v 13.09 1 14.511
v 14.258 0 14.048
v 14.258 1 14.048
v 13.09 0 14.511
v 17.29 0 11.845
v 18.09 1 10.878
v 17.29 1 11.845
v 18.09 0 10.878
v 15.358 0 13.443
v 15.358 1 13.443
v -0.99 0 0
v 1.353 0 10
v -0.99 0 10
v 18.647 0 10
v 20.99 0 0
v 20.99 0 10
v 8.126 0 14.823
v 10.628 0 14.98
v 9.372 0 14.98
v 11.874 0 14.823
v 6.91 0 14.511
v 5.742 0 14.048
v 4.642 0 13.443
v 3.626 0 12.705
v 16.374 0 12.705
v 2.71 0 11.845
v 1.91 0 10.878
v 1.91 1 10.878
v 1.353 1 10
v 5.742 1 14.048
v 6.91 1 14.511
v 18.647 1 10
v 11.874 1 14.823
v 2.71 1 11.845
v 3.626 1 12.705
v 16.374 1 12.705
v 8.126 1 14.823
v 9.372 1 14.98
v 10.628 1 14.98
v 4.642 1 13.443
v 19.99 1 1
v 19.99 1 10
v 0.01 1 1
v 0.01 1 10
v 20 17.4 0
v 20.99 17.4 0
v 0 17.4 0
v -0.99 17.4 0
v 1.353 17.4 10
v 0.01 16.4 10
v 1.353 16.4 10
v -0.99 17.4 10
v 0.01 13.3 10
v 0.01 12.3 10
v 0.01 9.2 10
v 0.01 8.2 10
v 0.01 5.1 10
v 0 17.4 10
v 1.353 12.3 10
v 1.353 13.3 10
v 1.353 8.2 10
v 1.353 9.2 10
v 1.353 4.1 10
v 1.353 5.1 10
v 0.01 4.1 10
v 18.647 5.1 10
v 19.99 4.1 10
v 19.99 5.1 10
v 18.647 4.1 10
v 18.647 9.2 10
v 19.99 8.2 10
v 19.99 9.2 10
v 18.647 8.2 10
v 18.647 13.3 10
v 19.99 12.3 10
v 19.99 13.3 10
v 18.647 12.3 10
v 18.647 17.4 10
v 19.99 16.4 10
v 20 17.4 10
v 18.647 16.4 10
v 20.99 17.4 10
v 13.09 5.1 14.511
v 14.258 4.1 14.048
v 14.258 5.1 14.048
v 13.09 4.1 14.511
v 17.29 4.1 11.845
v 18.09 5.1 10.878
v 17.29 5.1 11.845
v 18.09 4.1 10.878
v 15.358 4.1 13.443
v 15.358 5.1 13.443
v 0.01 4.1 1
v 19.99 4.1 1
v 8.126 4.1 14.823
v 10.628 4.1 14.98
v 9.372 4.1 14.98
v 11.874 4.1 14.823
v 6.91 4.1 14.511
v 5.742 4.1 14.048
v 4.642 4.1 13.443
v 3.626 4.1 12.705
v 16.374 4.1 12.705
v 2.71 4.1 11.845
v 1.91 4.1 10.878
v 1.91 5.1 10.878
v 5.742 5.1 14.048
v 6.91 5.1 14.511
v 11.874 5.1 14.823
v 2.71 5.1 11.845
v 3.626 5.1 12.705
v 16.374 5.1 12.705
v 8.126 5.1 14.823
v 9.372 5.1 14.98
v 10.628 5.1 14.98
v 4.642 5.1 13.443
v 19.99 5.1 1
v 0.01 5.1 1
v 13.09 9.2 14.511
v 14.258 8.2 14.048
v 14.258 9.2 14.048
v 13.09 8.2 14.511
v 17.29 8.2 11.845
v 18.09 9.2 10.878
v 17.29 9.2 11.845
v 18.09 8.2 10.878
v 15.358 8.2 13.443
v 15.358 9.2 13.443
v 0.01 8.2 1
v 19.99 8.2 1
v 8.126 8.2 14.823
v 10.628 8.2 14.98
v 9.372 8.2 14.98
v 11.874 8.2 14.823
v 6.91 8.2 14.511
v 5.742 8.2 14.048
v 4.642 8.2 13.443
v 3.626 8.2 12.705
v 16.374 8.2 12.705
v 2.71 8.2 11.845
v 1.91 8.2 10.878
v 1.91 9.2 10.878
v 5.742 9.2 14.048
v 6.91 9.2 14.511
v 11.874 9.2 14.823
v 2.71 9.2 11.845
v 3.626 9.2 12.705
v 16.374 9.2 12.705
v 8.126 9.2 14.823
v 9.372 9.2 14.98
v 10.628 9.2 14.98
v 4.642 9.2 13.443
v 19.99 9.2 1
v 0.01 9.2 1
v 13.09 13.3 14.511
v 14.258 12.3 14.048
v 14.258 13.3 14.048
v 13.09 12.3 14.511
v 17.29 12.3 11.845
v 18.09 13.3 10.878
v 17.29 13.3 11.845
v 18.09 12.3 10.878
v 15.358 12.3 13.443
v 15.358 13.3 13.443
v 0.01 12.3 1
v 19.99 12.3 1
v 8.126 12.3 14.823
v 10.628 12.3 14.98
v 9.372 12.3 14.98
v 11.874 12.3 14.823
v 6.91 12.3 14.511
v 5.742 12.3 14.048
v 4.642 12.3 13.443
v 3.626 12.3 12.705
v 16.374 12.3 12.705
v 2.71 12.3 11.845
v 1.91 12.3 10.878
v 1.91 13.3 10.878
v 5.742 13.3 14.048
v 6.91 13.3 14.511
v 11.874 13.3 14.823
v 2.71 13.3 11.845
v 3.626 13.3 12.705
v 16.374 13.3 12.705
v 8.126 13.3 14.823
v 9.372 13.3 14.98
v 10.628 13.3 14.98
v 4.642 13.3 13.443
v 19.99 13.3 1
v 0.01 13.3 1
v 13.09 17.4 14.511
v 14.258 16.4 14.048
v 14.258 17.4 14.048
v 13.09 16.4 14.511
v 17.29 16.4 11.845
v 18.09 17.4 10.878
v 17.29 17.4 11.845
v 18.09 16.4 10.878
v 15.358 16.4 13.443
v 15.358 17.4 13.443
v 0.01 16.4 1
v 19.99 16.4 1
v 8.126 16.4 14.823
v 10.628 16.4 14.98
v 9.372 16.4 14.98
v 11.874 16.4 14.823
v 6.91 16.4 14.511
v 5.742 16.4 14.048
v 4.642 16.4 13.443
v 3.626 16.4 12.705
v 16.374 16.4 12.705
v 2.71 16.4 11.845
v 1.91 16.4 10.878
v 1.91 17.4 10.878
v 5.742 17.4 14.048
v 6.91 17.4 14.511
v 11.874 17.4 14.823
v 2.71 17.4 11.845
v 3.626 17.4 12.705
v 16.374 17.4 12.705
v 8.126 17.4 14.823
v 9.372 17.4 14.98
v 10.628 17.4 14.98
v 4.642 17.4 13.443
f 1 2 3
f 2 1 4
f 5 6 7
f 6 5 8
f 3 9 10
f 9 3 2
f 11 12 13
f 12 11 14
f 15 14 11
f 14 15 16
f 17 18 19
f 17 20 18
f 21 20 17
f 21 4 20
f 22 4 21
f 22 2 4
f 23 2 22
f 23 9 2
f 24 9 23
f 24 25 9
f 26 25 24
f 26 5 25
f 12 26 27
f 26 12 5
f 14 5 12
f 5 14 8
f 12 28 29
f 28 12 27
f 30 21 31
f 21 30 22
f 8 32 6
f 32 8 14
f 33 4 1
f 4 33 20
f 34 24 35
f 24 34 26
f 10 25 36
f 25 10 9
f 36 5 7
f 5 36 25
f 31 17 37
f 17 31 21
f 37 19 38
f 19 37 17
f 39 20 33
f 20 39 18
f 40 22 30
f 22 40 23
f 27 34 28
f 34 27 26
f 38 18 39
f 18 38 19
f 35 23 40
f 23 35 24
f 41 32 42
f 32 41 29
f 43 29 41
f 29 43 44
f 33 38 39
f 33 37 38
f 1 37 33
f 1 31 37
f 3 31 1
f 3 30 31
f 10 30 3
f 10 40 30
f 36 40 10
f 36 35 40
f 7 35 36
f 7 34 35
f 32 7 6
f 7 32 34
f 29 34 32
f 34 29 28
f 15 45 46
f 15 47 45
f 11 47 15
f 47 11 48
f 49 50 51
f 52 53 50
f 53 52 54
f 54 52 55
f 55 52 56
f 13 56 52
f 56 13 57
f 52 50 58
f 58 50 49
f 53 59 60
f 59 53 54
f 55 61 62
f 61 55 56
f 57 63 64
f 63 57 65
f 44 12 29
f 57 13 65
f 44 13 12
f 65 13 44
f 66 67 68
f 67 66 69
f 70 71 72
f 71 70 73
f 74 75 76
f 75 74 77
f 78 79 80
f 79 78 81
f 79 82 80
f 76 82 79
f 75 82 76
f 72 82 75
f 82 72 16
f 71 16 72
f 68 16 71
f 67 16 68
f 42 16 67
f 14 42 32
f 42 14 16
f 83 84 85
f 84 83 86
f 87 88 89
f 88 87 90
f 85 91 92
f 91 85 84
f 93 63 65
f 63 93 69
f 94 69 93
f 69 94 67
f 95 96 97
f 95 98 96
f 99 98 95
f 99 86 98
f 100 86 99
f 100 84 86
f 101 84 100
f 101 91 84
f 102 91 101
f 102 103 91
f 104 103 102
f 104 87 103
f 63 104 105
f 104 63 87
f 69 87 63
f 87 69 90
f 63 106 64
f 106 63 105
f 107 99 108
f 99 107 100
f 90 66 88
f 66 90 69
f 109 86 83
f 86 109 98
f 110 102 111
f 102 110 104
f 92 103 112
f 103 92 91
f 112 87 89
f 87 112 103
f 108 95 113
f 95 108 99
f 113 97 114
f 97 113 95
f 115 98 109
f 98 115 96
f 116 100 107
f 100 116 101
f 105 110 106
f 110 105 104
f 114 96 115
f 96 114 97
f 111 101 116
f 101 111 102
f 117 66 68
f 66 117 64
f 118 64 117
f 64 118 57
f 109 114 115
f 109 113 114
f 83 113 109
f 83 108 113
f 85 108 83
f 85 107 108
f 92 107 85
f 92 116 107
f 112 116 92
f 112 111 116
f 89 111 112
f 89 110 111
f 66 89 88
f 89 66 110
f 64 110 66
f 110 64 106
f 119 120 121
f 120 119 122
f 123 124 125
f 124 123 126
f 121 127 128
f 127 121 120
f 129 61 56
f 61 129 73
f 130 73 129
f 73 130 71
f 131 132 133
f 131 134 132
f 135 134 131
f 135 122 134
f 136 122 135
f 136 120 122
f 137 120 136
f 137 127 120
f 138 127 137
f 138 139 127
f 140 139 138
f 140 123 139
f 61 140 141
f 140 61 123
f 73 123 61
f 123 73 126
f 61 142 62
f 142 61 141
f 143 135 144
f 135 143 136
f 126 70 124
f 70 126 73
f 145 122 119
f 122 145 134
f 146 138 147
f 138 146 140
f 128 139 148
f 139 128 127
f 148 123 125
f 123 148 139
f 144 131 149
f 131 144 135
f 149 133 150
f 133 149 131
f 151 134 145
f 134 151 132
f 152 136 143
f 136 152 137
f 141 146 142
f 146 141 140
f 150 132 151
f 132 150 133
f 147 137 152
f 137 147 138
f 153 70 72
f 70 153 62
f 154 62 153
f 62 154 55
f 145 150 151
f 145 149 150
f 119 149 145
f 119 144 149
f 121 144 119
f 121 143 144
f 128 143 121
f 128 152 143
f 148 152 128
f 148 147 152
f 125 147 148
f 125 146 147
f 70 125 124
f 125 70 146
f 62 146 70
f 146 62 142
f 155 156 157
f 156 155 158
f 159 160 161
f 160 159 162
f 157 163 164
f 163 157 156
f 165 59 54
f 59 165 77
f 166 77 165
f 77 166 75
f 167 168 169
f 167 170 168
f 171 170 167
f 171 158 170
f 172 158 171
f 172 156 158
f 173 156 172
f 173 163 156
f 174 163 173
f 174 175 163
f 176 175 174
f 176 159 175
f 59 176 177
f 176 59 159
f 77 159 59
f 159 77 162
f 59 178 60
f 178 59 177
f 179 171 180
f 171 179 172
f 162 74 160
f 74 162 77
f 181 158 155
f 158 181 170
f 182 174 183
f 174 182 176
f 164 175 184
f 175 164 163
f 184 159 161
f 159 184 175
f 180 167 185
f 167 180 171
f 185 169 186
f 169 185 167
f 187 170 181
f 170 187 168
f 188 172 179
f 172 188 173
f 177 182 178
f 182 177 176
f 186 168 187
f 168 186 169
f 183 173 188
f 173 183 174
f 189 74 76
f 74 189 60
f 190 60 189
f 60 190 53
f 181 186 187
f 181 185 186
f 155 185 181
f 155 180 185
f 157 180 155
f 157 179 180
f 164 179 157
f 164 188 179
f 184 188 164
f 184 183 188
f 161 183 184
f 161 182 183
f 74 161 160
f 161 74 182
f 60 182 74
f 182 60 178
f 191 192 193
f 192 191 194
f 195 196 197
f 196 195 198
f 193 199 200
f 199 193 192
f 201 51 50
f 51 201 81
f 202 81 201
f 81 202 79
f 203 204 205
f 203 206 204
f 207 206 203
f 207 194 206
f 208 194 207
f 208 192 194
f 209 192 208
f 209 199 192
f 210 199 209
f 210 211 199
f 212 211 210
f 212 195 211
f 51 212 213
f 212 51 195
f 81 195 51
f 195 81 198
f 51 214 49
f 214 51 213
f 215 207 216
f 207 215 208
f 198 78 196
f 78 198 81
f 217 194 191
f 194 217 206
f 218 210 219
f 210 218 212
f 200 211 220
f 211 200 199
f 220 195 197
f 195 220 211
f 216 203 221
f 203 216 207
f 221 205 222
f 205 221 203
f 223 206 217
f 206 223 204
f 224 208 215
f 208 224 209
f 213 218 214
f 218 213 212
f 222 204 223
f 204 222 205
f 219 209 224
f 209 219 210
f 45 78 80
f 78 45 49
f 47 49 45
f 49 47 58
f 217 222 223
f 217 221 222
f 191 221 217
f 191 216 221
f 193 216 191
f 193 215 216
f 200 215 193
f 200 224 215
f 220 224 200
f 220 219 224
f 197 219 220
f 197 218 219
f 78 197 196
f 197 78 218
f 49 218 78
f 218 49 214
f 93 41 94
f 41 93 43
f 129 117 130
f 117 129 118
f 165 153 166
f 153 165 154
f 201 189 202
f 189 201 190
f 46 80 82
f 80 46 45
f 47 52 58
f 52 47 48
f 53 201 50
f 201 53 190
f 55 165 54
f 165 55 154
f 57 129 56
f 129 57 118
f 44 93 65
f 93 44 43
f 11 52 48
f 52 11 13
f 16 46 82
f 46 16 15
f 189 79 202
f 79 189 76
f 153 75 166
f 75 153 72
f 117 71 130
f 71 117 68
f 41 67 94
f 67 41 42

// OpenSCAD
// Licence: Creative Commons, Attribution
// Parametrized button battery holder

// Thingiverse user by bmcage
// Same idea as http://www.thingiverse.com/thing:21041
// from http://www.thingiverse.com/thing:394954

//number of slots to hold battery
nr = 4;  // [2:30]
//what button battery should this hold
battery = "CR2032";  //[CR2032, AG13, custom]
battery = "custom";  //[CR2032, AG13, custom]
//if custom battery, what is radius ?
custom_radius = 10;
//if custom battery, what is width ?
custom_width = 3.1;
//width of the divider, hint: take 2*nozzle diameter of your printer
sizedivider = 0.8;
sizedivider = 1.0; // for 0.5mm nozzle



// low-profile, shorter height than coin battery
module short_divider(radius) {
  translate([radius, 0,radius])
  rotate([-90,0,0]) { // vertical on Z
      intersection() {
      translate([0,5,0])
          cylinder(r=radius, h=sizedivider,$fn=50); //disc
      //translate([0,0,-0.02])
      translate([-radius, -radius,0])
          cube([2*radius,2*radius,radius]);
        //cylinder(r=radius-3, h=sizedivider +0.04,$fn=10); // cut hole
    }
  translate([-radius,0,0]) cube([2*radius,radius,sizedivider]);  // bottom divider/wall
  }
}

// full height of coin battery
module divider(radius) {
  translate([radius, 0,radius])
  rotate([-90,0,0]) { // vertical on Z
    difference() {
      cylinder(r=radius, h=sizedivider,$fn=50); //disc
      translate([0,0,-0.02])
        cylinder(r=radius-3, h=sizedivider +0.04); // cut hole
    }
  translate([-radius,0,0]) cube([2*radius,radius,sizedivider]);  // bottom divider/wall
  }
}

module holder(radius, width) {
  length = nr*(sizedivider+width) + sizedivider;
  //rotate([0,0,45])
  union() {
          for (i=[0:nr]) {
            translate([0,i*(sizedivider+width),0])
              // TODO: select a divider style...
              short_divider(radius);
              //divider(radius);
          }
      cube([2*radius, length, sizedivider]); // bottom
      translate([-sizedivider+0.01,0,0]) cube([sizedivider, length, radius]); // side
      translate([2*radius-0.01,0,0]) cube([sizedivider, length, radius]); // side
  }
}


if (battery == "CR2032") {
//    holder(10,3);
    holder(10,3.1);
}
if (battery == "AG13") {
    holder(6,6.3);
}
if (battery == "custom") {
    holder(custom_radius,custom_width);
} 
